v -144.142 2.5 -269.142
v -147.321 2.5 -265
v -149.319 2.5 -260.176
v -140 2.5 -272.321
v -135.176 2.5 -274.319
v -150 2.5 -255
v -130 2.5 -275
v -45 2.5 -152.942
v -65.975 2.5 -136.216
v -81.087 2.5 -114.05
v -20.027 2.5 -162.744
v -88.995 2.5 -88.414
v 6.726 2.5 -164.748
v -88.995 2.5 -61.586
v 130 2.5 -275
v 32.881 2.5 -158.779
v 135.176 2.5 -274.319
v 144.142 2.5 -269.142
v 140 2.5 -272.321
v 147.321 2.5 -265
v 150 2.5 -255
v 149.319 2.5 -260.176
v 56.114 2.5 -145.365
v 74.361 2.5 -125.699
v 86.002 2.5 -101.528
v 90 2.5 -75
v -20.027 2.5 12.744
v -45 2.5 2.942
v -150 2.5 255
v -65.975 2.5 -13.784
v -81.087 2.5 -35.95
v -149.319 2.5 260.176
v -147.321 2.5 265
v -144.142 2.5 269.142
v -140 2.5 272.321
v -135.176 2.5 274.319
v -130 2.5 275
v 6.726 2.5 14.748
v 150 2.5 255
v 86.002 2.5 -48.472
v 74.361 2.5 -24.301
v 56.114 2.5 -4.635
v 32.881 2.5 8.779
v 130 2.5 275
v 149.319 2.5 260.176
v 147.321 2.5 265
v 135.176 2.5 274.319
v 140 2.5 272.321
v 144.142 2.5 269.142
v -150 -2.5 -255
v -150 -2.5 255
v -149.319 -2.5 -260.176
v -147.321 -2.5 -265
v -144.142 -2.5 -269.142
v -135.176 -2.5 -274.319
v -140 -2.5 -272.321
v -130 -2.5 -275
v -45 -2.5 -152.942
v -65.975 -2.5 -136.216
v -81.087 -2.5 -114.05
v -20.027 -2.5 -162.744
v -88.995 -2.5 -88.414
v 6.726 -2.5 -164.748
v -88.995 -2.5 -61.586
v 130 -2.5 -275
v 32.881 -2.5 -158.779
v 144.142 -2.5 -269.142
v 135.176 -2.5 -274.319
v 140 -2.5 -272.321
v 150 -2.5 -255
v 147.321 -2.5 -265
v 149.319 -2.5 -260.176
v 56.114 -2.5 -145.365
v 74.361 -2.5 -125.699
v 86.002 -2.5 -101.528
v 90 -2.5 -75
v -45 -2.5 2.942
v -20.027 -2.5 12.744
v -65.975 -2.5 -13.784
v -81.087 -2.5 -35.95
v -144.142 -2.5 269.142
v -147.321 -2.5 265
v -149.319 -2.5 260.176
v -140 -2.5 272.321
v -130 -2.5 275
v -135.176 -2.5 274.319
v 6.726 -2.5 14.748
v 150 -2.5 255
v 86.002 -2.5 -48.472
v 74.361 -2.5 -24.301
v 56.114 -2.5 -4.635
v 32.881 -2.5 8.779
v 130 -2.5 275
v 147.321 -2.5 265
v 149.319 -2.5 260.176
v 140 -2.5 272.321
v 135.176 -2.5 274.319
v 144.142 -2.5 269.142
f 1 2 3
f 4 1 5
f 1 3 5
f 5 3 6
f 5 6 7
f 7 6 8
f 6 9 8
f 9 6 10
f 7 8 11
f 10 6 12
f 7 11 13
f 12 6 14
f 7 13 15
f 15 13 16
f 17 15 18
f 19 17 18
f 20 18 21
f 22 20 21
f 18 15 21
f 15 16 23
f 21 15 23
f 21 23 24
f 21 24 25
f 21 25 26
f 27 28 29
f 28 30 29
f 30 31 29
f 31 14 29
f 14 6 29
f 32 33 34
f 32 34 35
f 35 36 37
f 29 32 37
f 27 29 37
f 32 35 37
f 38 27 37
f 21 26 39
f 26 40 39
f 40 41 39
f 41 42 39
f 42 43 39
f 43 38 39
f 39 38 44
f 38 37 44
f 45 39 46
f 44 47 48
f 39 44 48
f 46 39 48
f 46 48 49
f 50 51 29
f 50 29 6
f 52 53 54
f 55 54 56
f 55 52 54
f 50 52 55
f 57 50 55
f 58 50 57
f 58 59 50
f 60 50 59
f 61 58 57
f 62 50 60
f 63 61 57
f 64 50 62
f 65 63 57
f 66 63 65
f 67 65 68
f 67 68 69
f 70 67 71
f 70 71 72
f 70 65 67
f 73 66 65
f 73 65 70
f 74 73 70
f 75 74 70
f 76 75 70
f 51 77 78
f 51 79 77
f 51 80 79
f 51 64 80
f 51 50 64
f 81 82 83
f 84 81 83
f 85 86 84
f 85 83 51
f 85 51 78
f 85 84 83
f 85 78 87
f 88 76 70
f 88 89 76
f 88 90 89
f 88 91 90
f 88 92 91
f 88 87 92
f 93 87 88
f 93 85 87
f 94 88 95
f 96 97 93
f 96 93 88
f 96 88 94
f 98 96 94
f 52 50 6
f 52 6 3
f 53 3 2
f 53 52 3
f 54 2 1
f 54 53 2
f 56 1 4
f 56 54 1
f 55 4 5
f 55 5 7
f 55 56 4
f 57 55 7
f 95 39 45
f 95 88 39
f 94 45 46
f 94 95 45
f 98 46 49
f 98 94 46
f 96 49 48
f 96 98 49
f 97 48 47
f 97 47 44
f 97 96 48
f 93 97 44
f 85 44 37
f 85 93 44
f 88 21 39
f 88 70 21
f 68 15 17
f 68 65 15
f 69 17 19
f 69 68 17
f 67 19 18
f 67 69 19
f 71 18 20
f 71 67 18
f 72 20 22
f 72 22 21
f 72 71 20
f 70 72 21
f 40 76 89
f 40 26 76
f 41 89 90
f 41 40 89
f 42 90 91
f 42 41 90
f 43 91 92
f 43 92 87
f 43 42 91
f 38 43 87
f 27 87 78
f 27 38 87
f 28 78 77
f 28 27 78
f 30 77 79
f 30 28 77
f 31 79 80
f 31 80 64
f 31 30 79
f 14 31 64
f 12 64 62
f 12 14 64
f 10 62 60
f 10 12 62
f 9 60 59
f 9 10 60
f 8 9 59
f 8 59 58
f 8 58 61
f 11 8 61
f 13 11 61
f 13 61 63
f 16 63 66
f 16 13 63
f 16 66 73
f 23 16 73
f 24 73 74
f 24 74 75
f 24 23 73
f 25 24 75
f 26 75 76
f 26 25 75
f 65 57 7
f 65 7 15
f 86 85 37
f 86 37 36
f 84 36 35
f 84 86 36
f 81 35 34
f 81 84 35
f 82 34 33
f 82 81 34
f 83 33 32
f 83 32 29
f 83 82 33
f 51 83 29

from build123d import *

# Parameters (mm, degrees)
F0_R     = 90
F1_DEPTH = 2.5


with BuildPart() as f1:
    # F0 (on Front) → F1 (new body, symmetric)
    with BuildSketch(Plane.XZ):
        with BuildLine():
            Line((130, 275), (-130, 275))
            ThreePointArc((-130, 275), (-144.142136, 269.142136), (-150, 255))
            Line((-150, 255), (-150, -255))
            ThreePointArc((-150, -255), (-144.142136, -269.142136), (-130, -275))
            Line((-130, -275), (130, -275))
            ThreePointArc((130, -275), (144.142136, -269.142136), (150, -255))
            Line((150, -255), (150, 255))
            ThreePointArc((150, 255), (144.142136, 269.142136), (130, 275))
        make_face()
        with Locations((0, -75)):
            Circle(F0_R, mode=Mode.SUBTRACT)
    extrude(amount=F1_DEPTH, both=True)


solid = f1.part
